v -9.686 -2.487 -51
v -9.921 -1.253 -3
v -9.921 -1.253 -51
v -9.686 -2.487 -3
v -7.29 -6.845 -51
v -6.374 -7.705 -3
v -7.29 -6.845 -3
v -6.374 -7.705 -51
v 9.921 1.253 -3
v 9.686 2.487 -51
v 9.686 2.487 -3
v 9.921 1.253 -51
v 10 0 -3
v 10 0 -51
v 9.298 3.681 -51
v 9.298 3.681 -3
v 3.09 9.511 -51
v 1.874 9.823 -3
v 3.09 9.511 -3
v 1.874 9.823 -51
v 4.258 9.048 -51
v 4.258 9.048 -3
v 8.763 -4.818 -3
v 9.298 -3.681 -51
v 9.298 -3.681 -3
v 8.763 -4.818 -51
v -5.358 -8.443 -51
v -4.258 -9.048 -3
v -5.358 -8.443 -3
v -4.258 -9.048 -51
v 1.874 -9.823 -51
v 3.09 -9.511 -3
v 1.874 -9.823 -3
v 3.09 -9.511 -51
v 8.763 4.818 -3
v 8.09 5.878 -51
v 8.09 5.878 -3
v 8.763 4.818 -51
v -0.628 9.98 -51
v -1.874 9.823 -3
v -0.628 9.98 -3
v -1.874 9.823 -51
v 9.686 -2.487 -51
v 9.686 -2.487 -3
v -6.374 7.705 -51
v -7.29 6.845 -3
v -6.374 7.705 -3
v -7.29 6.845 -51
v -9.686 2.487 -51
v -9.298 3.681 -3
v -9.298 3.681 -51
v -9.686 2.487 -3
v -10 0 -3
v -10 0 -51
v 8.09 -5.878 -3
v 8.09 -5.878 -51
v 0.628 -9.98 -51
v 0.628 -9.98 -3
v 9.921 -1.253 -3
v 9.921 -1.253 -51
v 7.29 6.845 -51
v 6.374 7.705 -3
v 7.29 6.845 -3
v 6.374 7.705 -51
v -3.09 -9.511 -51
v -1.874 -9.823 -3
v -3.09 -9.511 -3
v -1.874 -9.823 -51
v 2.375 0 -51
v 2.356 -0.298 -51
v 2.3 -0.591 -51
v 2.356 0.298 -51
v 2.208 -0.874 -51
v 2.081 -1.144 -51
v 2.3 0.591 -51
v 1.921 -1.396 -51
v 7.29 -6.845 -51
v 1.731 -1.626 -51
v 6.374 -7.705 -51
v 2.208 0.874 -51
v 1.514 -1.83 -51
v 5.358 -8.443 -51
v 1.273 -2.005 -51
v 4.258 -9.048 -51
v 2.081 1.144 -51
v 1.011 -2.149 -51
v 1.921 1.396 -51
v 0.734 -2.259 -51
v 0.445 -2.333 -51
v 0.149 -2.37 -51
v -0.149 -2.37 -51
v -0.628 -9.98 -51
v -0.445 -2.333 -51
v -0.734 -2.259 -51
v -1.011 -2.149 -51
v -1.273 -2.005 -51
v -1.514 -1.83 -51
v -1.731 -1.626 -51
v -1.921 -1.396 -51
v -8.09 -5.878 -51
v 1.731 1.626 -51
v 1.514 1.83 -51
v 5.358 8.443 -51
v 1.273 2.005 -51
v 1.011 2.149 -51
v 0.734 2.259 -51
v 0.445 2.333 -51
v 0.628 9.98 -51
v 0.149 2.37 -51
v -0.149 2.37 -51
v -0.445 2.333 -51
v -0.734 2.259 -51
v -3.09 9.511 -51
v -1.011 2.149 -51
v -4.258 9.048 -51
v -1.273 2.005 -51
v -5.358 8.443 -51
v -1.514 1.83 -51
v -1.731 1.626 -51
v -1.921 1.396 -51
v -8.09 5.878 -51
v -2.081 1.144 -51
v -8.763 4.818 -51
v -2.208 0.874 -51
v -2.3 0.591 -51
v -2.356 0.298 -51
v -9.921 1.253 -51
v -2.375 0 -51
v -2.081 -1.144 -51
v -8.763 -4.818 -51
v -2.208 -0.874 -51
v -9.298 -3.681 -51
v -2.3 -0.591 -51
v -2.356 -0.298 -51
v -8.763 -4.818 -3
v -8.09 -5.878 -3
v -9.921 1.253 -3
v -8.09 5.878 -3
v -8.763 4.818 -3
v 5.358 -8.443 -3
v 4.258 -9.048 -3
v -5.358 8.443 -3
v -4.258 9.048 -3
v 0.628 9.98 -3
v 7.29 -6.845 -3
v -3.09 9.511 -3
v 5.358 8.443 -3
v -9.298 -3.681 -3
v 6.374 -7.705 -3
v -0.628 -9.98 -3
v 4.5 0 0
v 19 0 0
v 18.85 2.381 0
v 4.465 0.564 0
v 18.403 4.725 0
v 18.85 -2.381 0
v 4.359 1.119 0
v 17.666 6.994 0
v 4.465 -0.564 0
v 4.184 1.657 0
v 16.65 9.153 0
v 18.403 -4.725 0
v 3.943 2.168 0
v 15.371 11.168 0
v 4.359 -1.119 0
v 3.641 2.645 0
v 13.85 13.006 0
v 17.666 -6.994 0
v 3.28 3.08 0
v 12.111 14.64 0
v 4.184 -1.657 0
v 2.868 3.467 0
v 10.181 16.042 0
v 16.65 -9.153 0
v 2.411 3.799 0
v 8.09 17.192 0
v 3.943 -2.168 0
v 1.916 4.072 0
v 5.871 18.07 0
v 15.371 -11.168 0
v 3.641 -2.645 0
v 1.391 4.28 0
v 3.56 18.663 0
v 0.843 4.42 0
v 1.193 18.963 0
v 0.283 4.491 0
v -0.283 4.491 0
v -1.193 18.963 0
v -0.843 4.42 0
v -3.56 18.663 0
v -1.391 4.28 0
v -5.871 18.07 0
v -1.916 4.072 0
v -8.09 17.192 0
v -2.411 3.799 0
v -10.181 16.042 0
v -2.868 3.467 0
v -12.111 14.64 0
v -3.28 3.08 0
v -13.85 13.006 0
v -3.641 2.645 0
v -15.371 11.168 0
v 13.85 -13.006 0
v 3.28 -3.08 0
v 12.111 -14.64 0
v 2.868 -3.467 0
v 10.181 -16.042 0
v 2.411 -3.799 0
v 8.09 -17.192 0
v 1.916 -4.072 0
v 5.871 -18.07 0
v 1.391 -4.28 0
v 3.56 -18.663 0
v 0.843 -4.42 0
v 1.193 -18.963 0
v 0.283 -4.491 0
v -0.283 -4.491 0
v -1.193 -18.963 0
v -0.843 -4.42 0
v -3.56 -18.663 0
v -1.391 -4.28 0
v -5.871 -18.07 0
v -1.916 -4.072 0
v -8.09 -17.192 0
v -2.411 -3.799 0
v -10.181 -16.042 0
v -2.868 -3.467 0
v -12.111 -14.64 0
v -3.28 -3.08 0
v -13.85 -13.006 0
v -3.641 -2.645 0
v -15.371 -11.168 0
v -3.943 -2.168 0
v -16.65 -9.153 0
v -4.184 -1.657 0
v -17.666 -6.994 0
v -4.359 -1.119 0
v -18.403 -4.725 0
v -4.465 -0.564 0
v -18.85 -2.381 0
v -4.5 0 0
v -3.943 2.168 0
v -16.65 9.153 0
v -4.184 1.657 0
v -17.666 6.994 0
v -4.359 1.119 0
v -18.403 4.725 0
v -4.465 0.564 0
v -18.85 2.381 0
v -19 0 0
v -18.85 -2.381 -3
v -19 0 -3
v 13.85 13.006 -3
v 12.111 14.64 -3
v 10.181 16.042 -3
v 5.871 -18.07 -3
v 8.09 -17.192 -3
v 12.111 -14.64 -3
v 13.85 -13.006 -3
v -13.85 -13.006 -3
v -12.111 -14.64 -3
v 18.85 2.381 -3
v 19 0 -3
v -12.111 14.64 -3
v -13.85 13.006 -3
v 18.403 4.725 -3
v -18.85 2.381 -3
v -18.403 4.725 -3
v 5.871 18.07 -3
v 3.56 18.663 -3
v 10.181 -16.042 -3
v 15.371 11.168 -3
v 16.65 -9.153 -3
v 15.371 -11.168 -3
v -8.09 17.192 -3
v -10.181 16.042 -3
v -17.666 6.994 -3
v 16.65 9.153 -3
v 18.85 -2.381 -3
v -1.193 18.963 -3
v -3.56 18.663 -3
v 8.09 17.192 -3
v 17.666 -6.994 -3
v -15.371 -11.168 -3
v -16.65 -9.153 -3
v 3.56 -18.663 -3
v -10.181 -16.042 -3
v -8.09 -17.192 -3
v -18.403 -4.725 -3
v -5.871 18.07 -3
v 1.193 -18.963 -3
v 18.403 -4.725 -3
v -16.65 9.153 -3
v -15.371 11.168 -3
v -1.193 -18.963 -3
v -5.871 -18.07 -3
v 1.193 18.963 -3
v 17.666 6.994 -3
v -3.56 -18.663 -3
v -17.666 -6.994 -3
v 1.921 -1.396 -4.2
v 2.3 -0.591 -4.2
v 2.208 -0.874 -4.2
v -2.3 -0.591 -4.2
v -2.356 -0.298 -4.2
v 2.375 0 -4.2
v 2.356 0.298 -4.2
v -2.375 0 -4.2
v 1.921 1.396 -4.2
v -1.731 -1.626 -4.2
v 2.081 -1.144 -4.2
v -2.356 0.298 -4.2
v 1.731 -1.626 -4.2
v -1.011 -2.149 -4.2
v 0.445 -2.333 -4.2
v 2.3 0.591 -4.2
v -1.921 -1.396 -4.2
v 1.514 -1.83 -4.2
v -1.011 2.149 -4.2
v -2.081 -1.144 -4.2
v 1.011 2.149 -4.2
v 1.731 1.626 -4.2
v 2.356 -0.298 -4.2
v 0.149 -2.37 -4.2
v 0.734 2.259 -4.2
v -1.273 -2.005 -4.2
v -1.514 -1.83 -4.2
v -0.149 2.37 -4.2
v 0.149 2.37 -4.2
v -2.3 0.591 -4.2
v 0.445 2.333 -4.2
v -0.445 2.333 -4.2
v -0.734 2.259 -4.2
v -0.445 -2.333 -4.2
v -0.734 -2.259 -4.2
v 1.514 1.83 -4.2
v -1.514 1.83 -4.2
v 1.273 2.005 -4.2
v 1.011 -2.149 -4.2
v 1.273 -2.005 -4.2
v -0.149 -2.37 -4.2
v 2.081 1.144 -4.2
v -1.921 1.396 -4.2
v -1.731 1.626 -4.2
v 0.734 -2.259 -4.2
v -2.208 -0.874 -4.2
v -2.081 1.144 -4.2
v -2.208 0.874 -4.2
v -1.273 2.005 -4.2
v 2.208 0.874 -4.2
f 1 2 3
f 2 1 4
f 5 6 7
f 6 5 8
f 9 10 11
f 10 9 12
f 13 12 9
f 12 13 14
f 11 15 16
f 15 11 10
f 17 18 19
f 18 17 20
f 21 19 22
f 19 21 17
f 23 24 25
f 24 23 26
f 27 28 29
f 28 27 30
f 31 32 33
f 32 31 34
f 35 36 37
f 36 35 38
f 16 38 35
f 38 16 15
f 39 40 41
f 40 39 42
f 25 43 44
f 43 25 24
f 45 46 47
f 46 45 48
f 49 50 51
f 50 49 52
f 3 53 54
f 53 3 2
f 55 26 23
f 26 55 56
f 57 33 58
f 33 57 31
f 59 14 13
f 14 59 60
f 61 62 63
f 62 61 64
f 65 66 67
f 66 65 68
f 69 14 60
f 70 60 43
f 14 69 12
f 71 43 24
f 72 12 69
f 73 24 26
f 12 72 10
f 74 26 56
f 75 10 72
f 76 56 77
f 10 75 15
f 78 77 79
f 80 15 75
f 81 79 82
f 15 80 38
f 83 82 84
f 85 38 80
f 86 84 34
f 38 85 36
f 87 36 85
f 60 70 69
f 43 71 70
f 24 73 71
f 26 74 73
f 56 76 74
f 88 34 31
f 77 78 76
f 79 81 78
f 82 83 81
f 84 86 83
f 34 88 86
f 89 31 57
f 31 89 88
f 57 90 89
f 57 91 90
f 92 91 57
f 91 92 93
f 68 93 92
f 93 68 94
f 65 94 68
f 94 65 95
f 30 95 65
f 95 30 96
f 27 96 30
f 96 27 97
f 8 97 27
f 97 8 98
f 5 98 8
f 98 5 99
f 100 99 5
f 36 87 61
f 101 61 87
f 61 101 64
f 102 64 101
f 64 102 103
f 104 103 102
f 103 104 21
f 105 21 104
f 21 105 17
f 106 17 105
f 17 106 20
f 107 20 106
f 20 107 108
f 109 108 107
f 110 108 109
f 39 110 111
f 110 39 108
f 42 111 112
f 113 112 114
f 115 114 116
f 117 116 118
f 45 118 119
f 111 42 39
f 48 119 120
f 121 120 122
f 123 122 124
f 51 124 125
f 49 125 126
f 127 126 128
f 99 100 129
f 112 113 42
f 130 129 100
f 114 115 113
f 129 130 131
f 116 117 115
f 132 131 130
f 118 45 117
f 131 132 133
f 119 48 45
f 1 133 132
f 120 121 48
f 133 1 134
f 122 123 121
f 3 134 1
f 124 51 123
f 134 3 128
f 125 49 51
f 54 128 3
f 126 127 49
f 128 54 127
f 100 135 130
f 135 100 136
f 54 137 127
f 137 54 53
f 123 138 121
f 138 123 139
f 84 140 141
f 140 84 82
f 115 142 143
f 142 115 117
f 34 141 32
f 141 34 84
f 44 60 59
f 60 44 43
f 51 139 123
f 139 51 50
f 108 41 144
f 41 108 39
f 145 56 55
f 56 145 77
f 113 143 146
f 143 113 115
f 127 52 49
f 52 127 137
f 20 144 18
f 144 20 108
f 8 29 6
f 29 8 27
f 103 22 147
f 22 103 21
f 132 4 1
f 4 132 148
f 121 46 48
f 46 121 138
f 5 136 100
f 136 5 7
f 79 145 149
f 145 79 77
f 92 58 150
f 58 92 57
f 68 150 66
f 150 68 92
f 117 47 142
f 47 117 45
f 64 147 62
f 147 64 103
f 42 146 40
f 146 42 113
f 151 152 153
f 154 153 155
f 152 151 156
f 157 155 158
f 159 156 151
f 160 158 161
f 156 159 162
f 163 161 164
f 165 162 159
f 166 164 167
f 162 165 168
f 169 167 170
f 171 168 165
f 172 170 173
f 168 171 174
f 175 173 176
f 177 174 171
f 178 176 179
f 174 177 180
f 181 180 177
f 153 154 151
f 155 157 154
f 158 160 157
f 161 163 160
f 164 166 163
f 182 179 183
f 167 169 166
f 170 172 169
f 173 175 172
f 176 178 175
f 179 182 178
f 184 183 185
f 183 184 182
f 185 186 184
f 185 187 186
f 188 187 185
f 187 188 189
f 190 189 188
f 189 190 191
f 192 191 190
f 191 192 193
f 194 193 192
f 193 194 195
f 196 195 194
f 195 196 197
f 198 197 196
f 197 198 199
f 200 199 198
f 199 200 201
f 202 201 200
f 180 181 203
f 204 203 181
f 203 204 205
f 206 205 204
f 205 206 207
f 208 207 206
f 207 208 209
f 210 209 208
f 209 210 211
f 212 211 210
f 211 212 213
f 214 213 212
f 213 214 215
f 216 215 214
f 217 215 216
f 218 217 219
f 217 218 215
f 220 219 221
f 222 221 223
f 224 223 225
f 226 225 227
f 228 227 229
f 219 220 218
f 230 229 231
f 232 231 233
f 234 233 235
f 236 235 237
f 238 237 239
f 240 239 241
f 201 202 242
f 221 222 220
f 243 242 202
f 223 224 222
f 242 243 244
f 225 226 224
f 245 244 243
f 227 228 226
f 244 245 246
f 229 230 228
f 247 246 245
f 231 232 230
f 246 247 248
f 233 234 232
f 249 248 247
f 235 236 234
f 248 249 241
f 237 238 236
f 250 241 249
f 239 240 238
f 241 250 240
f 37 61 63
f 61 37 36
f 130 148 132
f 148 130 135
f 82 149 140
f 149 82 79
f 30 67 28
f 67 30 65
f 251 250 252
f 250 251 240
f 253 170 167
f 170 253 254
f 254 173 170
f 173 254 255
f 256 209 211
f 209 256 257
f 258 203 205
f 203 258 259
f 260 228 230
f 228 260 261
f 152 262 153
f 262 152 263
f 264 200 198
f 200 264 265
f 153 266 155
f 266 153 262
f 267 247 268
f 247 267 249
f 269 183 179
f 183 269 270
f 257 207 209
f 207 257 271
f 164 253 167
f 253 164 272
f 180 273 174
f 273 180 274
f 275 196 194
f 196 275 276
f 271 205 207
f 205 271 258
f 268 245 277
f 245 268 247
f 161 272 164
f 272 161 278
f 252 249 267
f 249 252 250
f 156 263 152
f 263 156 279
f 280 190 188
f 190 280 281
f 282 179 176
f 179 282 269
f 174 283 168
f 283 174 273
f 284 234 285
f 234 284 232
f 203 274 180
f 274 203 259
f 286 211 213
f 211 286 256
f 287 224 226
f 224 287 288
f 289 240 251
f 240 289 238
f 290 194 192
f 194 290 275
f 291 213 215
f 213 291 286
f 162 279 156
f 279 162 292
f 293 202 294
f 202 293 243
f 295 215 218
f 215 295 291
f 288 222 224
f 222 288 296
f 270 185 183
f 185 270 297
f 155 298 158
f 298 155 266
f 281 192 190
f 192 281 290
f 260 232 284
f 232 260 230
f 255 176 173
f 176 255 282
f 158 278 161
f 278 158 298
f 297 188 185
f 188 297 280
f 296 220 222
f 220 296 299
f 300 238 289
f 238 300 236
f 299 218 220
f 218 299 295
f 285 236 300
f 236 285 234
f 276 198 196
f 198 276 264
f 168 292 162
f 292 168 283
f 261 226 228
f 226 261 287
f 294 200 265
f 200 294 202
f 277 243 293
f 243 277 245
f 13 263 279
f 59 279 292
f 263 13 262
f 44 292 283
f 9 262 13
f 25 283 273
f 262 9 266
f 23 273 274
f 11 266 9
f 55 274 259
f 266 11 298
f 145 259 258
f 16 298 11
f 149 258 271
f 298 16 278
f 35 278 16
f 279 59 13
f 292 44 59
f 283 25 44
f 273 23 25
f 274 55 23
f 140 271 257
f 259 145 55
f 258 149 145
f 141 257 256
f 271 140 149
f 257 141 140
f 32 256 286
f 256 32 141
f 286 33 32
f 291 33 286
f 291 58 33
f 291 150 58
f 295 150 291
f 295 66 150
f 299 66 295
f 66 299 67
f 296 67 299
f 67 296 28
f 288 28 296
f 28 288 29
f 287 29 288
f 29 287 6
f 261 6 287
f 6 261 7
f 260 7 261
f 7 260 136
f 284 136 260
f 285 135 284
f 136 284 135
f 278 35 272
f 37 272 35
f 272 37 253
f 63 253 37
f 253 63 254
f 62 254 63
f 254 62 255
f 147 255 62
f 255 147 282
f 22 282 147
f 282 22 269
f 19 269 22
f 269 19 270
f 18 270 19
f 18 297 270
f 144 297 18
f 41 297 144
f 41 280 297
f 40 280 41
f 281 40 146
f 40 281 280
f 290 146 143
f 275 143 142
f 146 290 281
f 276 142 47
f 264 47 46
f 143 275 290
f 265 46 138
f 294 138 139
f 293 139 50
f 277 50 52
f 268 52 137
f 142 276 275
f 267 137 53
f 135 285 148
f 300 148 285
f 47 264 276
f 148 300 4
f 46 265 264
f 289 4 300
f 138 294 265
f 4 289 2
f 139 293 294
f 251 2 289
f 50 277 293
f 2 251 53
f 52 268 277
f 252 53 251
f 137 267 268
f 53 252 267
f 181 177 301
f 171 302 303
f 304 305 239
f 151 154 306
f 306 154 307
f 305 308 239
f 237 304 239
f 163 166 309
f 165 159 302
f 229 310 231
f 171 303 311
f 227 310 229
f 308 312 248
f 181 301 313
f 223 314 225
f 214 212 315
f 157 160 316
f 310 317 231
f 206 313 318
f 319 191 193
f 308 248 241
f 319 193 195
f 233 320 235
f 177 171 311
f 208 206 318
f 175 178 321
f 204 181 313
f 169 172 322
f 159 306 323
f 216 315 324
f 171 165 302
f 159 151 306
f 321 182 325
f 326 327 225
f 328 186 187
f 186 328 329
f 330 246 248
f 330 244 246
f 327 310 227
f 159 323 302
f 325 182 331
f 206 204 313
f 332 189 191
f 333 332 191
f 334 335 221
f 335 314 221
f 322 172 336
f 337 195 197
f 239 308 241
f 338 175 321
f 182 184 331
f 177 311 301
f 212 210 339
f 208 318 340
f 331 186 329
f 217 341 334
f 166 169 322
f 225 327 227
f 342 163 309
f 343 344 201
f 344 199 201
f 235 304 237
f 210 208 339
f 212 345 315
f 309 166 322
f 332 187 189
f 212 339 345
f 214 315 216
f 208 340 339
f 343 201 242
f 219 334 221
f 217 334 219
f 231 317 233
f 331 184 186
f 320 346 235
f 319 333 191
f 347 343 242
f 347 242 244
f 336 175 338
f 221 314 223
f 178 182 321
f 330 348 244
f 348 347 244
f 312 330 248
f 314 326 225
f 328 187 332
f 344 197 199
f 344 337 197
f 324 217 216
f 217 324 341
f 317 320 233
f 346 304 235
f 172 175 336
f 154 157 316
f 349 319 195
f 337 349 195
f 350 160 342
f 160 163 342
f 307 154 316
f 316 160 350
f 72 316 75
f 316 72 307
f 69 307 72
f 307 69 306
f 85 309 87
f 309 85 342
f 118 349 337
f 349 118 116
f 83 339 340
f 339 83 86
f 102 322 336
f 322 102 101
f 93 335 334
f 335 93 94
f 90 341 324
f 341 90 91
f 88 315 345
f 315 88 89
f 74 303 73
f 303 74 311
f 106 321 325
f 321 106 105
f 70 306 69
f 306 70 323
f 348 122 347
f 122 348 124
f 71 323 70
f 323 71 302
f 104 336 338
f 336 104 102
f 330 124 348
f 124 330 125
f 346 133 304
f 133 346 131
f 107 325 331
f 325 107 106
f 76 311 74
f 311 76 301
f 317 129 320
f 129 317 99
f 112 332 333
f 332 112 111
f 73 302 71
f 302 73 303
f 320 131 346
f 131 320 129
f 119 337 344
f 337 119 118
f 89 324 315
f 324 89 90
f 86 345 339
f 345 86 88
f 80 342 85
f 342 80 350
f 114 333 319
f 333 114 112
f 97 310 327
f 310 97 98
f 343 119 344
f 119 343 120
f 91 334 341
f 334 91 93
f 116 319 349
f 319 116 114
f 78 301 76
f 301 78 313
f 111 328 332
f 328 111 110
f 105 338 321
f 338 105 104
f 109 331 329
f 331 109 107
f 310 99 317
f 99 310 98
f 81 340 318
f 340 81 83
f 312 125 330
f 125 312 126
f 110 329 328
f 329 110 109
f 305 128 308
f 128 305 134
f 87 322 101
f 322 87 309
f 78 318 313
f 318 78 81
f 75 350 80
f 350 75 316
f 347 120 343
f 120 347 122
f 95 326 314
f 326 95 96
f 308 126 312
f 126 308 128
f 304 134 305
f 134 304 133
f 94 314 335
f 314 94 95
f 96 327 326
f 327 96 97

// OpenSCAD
$fn = 50;


difference() {
	union() {
		translate(v = [0, 0, -51.0000000000]) {
			cylinder(h = 51, r = 10.0000000000);
		}
		translate(v = [0, 0, -3.0000000000]) {
			cylinder(h = 3, r = 19.0000000000);
		}
	}
	union() {
		translate(v = [0, 0, 0]) {
			rotate(a = [0, 0, 0]) {
				difference() {
					union() {
						#translate(v = [0, 0, -51.0000000000]) {
							cylinder(h = 51, r = 2.2500000000);
						}
						#translate(v = [0, 0, -4.2000000000]) {
							cylinder(h = 4.2000000000, r1 = 2.3750000000, r2 = 4.5000000000);
						}
						#translate(v = [0, 0, -51.0000000000]) {
							cylinder(h = 51, r = 2.3750000000);
						}
						#translate(v = [0, 0, -51.0000000000]) {
							cylinder(h = 51, r = 2.2500000000);
						}
					}
					union();
				}
			}
		}
	}
}
